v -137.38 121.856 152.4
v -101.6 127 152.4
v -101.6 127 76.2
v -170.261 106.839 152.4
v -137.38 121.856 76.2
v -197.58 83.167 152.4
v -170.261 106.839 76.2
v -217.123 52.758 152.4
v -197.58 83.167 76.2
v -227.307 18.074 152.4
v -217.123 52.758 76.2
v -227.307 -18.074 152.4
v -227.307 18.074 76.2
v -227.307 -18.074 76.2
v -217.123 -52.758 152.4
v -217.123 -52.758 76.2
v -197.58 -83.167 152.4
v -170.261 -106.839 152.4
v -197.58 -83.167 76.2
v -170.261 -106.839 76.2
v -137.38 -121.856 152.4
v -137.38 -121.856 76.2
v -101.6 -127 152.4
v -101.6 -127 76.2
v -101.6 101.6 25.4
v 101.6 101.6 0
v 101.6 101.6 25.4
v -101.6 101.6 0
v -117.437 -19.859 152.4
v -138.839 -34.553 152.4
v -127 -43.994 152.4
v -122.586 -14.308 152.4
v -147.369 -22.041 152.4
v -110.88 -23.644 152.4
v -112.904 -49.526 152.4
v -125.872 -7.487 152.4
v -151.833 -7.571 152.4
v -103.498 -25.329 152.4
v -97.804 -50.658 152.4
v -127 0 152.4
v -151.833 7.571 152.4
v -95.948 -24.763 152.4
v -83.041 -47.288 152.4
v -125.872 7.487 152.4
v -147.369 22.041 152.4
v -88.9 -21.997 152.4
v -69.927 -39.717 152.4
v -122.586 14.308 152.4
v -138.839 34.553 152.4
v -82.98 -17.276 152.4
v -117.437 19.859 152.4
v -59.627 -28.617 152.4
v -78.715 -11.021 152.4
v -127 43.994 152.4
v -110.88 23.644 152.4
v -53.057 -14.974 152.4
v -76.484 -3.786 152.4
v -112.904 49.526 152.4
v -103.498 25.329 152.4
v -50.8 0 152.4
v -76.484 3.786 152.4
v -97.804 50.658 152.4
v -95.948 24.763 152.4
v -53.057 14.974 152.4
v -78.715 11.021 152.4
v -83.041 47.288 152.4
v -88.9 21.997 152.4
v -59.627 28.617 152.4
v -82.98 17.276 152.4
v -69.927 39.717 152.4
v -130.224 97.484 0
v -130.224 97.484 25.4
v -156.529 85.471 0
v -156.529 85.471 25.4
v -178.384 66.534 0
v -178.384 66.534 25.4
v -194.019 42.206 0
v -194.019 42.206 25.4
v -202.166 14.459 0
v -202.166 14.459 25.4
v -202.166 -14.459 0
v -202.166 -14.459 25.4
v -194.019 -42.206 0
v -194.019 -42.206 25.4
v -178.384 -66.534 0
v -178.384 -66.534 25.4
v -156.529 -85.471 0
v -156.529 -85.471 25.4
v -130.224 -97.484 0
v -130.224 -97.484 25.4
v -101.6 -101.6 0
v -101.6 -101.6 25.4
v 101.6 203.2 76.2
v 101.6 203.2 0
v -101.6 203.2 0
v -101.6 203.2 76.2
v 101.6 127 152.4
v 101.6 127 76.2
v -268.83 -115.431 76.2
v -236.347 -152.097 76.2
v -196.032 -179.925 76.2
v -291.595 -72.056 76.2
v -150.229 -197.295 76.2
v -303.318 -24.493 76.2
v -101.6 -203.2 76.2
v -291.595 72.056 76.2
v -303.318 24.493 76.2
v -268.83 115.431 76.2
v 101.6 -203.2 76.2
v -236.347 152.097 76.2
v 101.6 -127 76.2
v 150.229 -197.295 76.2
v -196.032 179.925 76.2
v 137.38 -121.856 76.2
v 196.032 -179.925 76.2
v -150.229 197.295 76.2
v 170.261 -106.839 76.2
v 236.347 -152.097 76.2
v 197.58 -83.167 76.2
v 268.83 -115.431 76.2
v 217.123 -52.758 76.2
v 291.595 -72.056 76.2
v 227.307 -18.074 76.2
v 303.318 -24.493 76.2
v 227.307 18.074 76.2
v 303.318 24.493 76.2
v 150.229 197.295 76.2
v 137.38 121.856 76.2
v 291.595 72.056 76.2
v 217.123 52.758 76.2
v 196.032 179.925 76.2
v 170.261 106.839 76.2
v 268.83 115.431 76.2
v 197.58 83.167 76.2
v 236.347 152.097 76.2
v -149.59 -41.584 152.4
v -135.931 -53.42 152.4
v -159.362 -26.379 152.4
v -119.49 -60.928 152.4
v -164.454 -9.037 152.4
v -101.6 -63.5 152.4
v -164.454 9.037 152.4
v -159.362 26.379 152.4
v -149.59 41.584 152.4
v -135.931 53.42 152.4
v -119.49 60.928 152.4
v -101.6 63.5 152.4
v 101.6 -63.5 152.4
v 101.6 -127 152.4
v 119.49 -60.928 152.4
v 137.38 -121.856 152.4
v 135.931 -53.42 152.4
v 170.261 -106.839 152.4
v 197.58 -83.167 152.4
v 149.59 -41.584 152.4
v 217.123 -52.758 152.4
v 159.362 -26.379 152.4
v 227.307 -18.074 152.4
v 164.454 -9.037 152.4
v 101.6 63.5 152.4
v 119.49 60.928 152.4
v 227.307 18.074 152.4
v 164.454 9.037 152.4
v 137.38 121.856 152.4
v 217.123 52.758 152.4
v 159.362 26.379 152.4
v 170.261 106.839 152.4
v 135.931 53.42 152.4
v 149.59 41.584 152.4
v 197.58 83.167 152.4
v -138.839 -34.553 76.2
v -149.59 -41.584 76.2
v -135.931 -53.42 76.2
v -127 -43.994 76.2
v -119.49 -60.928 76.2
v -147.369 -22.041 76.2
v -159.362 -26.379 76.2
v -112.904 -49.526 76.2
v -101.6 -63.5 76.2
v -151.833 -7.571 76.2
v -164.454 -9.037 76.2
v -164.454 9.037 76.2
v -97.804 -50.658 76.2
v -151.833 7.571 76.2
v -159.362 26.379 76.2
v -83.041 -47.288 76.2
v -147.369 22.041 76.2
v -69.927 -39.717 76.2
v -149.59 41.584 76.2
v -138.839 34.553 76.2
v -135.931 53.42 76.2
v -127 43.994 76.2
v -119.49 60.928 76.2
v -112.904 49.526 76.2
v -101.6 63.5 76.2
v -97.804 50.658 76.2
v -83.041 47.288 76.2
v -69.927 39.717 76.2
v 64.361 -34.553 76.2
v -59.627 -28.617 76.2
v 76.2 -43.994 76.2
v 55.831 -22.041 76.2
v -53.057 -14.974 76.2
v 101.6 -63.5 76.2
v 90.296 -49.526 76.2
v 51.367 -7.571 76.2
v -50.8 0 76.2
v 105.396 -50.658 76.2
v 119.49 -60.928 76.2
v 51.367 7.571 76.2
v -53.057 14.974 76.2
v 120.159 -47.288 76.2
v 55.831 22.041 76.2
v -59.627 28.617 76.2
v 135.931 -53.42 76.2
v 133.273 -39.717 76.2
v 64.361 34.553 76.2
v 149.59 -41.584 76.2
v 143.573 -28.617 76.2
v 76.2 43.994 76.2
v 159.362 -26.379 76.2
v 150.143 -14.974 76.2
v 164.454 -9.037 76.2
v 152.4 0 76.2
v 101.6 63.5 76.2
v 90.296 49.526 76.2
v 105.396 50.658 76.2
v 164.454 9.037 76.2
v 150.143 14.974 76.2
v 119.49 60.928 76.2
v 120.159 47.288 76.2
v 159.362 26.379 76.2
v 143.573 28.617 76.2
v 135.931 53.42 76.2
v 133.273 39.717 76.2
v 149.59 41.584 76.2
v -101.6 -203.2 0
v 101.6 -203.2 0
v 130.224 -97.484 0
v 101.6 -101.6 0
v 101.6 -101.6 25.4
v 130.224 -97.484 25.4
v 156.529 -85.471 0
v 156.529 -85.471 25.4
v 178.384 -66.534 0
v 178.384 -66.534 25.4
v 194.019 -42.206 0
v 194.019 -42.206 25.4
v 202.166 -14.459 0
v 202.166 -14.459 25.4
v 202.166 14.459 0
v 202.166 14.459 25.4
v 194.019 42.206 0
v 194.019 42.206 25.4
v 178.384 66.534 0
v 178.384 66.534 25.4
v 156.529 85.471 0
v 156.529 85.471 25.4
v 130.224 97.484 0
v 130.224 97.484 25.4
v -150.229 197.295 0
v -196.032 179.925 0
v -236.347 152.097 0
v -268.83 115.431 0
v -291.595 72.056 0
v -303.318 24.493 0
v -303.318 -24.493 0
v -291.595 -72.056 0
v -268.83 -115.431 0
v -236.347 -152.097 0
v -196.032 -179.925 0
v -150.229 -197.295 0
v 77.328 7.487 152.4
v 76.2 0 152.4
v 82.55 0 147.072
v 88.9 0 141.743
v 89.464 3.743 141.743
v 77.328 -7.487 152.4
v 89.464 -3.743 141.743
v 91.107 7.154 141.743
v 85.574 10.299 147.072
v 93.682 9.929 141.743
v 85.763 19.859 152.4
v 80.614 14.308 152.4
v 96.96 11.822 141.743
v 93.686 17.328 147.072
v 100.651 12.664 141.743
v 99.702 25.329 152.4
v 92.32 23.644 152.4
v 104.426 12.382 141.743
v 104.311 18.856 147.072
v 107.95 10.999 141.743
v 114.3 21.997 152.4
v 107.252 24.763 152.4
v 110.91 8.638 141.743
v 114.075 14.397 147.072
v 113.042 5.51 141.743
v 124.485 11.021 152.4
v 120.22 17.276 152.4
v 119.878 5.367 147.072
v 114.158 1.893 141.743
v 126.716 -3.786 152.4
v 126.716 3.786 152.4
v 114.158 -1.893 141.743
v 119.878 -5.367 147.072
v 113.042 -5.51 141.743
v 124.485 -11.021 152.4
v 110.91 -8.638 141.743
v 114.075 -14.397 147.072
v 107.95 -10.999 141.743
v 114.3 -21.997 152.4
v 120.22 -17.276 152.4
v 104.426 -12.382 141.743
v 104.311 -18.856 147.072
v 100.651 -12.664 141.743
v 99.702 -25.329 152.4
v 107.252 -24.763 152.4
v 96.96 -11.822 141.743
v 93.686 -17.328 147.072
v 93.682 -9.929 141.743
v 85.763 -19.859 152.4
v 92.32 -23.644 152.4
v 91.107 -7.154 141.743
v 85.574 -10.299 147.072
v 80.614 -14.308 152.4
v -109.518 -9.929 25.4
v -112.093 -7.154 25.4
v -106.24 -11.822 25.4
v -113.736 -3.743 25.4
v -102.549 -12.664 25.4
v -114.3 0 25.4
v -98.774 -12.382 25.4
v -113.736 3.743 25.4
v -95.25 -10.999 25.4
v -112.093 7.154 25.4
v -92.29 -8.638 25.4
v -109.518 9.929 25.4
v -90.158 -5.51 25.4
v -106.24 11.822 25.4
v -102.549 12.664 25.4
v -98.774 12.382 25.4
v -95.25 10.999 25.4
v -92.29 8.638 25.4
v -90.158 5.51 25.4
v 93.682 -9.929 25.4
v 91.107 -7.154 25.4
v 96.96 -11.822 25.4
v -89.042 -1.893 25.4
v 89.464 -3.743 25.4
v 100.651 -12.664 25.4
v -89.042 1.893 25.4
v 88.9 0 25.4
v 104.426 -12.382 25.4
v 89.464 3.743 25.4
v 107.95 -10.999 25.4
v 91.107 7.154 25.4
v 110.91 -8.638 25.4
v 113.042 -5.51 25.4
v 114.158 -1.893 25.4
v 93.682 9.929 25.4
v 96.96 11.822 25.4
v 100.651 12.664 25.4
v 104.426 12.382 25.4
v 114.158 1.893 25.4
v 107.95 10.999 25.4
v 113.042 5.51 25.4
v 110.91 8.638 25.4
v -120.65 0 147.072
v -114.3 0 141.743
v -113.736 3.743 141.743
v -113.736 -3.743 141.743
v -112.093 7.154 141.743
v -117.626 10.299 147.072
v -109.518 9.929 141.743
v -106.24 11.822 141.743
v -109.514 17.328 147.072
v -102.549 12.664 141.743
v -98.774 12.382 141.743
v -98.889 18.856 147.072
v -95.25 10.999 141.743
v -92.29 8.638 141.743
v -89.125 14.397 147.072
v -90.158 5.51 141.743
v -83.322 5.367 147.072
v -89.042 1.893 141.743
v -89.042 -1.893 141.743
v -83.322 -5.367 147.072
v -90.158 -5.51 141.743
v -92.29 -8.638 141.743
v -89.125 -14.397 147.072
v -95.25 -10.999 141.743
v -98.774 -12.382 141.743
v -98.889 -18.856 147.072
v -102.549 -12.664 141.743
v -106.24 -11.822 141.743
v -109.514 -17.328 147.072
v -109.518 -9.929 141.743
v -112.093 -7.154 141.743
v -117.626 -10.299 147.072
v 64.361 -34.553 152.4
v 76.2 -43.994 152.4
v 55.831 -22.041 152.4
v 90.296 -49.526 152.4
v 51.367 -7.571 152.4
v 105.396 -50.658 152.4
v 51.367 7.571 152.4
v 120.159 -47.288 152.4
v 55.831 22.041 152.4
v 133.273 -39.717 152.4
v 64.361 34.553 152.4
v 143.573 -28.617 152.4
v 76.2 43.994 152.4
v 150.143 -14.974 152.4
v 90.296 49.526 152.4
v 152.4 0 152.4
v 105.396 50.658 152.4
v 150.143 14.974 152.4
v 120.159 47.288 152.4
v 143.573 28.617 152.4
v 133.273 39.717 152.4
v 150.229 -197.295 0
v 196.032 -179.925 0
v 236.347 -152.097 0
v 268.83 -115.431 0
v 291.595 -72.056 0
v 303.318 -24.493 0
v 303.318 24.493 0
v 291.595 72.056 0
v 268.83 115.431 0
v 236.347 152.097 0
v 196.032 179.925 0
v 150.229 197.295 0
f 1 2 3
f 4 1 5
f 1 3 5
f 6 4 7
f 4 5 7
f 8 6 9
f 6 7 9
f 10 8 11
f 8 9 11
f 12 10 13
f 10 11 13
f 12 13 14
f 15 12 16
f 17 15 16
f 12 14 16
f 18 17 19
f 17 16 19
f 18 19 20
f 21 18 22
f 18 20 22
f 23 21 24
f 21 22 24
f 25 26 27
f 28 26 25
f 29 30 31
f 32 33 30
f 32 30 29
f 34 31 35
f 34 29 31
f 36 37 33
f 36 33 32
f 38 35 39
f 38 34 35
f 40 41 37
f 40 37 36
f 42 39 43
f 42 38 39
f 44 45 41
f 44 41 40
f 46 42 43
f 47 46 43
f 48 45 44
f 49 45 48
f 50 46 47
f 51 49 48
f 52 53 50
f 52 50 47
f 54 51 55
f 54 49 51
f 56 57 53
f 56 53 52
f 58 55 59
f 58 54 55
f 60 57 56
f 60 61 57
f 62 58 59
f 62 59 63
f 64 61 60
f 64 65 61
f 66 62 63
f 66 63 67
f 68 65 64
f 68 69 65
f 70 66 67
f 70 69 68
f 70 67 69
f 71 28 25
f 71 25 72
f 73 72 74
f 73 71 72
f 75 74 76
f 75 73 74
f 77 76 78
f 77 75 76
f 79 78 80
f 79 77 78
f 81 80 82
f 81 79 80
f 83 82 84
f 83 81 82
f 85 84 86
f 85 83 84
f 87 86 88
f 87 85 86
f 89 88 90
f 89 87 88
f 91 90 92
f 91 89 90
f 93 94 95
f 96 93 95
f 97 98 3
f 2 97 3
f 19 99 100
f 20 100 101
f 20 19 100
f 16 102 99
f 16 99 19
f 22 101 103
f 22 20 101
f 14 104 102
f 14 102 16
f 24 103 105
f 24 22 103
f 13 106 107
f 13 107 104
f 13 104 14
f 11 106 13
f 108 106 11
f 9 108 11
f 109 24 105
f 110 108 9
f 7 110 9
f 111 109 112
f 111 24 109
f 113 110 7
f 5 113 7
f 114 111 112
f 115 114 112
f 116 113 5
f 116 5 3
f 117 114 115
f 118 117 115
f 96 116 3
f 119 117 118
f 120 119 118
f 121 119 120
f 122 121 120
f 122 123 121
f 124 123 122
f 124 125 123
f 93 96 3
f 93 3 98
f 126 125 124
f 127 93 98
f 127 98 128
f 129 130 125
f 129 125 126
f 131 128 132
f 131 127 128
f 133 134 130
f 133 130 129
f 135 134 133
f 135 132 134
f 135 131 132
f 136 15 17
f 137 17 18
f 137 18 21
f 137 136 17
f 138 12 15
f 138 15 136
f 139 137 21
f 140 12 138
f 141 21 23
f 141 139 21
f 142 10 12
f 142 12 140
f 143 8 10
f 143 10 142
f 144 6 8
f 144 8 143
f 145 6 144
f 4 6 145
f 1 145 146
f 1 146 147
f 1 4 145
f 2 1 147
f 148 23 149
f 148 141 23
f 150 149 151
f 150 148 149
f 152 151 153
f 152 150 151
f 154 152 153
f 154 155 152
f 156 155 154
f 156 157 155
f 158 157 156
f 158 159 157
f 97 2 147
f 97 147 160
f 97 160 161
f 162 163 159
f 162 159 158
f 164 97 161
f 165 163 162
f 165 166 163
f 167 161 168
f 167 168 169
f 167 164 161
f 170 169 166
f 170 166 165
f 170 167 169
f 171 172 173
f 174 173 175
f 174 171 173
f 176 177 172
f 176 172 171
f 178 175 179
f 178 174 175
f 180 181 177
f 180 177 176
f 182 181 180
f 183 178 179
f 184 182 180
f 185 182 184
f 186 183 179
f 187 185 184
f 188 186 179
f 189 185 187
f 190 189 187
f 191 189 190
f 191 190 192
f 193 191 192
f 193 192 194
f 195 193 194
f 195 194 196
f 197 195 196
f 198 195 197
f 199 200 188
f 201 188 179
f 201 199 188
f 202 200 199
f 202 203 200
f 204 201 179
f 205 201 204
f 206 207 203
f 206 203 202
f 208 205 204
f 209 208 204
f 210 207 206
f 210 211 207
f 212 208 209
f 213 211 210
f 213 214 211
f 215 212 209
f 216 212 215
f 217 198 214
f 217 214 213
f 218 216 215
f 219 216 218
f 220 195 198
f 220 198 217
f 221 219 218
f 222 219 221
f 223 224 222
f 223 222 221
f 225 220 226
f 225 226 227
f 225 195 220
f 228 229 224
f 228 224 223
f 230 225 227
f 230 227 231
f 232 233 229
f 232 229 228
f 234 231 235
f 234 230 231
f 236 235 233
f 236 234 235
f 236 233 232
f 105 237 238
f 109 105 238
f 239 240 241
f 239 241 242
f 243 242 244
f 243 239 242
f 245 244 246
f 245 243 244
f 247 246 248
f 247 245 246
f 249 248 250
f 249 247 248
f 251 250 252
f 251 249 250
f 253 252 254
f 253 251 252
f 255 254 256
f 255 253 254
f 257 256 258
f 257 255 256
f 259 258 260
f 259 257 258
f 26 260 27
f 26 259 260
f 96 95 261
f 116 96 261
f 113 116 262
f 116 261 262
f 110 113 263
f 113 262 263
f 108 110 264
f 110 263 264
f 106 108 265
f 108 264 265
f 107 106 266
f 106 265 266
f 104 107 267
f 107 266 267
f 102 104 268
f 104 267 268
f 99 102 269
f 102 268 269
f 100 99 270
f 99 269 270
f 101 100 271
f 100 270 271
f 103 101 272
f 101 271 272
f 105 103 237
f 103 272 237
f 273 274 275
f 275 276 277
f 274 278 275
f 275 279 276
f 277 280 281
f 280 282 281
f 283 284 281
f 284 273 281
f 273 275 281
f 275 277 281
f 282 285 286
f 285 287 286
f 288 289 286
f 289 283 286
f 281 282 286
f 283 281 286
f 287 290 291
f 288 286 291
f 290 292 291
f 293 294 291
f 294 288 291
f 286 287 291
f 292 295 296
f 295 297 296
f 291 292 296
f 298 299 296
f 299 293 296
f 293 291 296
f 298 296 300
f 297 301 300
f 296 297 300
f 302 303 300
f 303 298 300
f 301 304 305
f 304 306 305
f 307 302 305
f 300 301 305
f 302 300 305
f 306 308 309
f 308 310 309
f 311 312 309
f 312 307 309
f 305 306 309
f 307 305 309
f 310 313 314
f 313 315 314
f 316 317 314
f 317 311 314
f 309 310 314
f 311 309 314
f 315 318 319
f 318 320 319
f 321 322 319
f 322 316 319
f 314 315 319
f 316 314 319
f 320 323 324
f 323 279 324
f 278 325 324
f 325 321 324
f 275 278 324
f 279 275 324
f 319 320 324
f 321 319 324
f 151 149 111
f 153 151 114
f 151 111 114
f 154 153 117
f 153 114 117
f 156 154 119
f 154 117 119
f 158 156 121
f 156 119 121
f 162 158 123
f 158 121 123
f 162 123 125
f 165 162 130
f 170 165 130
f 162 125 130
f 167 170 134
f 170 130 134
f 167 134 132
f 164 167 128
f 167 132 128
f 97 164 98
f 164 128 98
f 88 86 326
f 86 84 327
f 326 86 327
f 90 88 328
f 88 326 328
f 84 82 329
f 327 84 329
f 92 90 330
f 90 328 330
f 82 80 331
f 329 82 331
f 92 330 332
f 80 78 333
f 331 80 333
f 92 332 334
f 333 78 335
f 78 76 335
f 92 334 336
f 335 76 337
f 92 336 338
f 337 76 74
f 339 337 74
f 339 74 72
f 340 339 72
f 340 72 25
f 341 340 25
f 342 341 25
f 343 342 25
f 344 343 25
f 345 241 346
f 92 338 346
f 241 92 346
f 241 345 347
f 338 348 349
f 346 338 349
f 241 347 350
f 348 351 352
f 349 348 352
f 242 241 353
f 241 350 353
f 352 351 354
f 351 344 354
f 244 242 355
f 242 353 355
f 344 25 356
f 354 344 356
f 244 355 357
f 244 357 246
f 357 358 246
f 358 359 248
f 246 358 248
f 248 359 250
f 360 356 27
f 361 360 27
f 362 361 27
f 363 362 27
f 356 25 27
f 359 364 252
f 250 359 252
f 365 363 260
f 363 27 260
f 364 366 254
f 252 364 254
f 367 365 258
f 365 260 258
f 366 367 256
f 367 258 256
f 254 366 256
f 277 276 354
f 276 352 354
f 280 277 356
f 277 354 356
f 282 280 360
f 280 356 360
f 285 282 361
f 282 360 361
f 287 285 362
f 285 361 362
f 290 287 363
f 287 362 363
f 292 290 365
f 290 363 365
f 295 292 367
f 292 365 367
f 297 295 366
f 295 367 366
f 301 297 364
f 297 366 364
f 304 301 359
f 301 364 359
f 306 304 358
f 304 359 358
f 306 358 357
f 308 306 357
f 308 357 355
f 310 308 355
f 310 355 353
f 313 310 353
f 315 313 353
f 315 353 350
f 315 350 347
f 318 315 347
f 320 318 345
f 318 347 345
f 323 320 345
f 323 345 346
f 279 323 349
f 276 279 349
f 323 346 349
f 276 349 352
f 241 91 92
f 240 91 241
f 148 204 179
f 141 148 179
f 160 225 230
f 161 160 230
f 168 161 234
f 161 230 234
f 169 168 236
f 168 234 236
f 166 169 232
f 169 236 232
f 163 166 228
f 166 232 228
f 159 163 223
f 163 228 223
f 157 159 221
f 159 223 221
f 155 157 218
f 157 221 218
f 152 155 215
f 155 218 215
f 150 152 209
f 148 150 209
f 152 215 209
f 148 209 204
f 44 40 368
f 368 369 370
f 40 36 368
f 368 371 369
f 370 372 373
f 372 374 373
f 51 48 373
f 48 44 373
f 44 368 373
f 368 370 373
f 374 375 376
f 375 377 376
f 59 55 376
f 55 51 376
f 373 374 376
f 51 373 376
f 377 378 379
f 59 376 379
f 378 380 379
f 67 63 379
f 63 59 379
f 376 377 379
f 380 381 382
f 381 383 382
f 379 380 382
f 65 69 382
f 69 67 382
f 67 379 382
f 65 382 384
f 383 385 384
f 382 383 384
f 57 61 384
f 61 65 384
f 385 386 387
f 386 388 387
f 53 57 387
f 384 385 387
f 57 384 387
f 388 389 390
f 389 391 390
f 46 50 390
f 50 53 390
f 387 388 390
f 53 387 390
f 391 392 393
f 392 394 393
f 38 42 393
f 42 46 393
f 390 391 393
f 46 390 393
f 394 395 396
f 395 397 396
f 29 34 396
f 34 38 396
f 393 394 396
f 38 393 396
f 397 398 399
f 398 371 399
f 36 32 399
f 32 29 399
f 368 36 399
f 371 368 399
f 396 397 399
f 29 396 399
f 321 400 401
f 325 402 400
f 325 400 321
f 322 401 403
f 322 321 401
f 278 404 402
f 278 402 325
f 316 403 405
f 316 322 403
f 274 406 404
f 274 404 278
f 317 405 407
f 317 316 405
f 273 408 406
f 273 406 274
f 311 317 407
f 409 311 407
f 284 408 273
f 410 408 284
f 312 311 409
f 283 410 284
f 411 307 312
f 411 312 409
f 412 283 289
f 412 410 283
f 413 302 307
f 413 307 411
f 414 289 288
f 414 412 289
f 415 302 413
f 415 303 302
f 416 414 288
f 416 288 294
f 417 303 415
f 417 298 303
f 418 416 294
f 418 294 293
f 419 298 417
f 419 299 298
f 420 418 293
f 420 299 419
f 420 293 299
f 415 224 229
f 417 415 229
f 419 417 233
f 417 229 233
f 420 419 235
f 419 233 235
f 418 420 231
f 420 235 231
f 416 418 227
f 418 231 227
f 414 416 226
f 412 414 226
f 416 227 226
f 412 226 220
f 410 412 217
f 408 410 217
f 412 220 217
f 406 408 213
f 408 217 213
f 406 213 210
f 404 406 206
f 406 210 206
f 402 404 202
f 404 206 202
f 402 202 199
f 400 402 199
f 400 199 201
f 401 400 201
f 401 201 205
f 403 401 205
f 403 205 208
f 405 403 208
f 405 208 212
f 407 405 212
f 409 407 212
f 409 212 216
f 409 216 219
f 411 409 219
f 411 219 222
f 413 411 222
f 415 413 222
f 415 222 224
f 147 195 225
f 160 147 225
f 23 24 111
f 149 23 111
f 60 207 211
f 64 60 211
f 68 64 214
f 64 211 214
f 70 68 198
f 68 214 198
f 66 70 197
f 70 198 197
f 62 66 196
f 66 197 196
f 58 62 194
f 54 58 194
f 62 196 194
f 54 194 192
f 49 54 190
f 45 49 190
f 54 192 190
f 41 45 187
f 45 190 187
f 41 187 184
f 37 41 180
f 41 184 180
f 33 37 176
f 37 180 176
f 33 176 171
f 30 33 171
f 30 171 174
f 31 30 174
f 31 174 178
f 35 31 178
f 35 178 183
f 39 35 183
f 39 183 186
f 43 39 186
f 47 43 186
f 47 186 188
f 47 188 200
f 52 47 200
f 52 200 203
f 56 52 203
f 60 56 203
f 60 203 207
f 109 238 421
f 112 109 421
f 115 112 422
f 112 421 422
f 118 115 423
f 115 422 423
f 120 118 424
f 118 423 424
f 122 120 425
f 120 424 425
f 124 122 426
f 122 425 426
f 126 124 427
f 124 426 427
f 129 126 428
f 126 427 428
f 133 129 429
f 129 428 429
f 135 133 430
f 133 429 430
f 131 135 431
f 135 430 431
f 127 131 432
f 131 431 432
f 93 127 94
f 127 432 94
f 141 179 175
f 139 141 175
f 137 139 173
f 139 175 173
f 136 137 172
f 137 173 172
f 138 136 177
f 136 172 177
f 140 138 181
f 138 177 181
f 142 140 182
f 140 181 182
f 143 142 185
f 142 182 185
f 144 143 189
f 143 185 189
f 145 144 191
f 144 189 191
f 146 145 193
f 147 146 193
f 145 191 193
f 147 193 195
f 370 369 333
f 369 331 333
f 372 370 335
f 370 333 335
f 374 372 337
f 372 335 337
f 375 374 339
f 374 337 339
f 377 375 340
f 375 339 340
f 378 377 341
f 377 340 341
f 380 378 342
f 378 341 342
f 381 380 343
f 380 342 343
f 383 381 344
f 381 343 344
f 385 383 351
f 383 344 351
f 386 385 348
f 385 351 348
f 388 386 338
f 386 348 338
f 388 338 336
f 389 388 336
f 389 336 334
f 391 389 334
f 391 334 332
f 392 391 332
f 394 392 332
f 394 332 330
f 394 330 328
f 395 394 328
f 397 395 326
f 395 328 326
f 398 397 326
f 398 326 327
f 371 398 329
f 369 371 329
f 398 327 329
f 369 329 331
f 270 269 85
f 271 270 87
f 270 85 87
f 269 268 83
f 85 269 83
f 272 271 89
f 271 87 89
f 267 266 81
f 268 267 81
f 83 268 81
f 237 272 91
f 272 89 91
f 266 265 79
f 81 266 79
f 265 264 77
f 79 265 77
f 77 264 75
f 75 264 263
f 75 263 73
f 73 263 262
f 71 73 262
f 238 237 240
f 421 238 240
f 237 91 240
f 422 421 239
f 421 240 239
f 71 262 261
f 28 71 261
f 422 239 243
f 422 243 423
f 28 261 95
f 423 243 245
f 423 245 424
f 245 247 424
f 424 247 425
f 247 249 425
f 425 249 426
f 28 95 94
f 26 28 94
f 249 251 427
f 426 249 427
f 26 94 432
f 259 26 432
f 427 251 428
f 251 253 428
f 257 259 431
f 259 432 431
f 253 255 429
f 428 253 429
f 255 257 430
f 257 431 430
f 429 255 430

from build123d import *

# Parameters (mm, degrees)
F0_R           = 50.8
F0_R_2         = 25.4
F1_DEPTH       = 76.2
F2_DEPTH       = 152.4
F4_DEPTH       = 25.4
F6_D           = 25.4
F6_CSINK_D     = 50.8
F6_CSINK_ANGLE = 100


# Not quite as in the source:
# - a feature names something its author has since deleted; it is built from what else it names


with BuildPart() as f1:
    # F0 (on Top) → F1 (new body)
    with BuildSketch(Plane.XY):
        with BuildLine():
            Line((101.6, 203.2), (-101.6, 203.2))
            ThreePointArc((-101.6, 203.2), (-304.8, 0), (-101.6, -203.2))
            Line((-101.6, -203.2), (101.6, -203.2))
            ThreePointArc((101.6, -203.2), (304.8, 0), (101.6, 203.2))
        make_face()
        with BuildLine():
            ThreePointArc((-101.6, -127), (-228.6, 0), (-101.6, 127))
            Line((-101.6, 127), (101.6, 127))
            ThreePointArc((101.6, 127), (228.6, 0), (101.6, -127))
            Line((101.6, -127), (-101.6, -127))
        make_face(mode=Mode.SUBTRACT)
        with BuildLine():
            Line((101.6, 127), (-101.6, 127))
            ThreePointArc((-101.6, 127), (-228.6, 0), (-101.6, -127))
            Line((-101.6, -127), (101.6, -127))
            ThreePointArc((101.6, -127), (228.6, 0), (101.6, 127))
        make_face()
        with BuildLine():
            ThreePointArc((101.6, 63.5), (165.1, 0), (101.6, -63.5))
            Line((101.6, -63.5), (-101.6, -63.5))
            ThreePointArc((-101.6, -63.5), (-165.1, 0), (-101.6, 63.5))
            Line((-101.6, 63.5), (101.6, 63.5))
        make_face(mode=Mode.SUBTRACT)
        with BuildLine():
            Line((-101.6, -63.5), (101.6, -63.5))
            ThreePointArc((101.6, -63.5), (165.1, 0), (101.6, 63.5))
            Line((101.6, 63.5), (-101.6, 63.5))
            ThreePointArc((-101.6, 63.5), (-165.1, 0), (-101.6, -63.5))
        make_face()
        with Locations((-101.6, 0)):
            Circle(F0_R, mode=Mode.SUBTRACT)
        with Locations((101.6, 0)):
            Circle(F0_R, mode=Mode.SUBTRACT)
        with Locations((-101.6, 0)):
            Circle(F0_R)
        with Locations((-101.6, 0)):
            Circle(F0_R_2, mode=Mode.SUBTRACT)
        with Locations((101.6, 0)):
            Circle(F0_R)
        with Locations((101.6, 0)):
            Circle(F0_R_2, mode=Mode.SUBTRACT)
        with Locations((-101.6, 0)):
            Circle(F0_R_2)
        with Locations((101.6, 0)):
            Circle(F0_R_2)
    extrude(amount=F1_DEPTH)

    # F0 (on Top) → F2 (join)
    with BuildSketch(Plane.XY):
        with BuildLine():
            Line((101.6, 127), (-101.6, 127))
            ThreePointArc((-101.6, 127), (-228.6, 0), (-101.6, -127))
            Line((-101.6, -127), (101.6, -127))
            ThreePointArc((101.6, -127), (228.6, 0), (101.6, 127))
        make_face()
        with BuildLine():
            ThreePointArc((101.6, 63.5), (165.1, 0), (101.6, -63.5))
            Line((101.6, -63.5), (-101.6, -63.5))
            ThreePointArc((-101.6, -63.5), (-165.1, 0), (-101.6, 63.5))
            Line((-101.6, 63.5), (101.6, 63.5))
        make_face(mode=Mode.SUBTRACT)
        with Locations((101.6, 0)):
            Circle(F0_R)
        with Locations((101.6, 0)):
            Circle(F0_R_2, mode=Mode.SUBTRACT)
        with Locations((-101.6, 0)):
            Circle(F0_R)
        with Locations((-101.6, 0)):
            Circle(F0_R_2, mode=Mode.SUBTRACT)
        with Locations((101.6, 0)):
            Circle(F0_R_2)
        with Locations((-101.6, 0)):
            Circle(F0_R_2)
    extrude(amount=F2_DEPTH)

    # F3 (on face) → F4 (cut)
    with BuildSketch(Plane.XY):
        with BuildLine():
            Line((101.6, 101.6), (-101.6, 101.6))
            ThreePointArc((-101.6, 101.6), (-203.2, 0), (-101.6, -101.6))
            Line((-101.6, -101.6), (101.6, -101.6))
            ThreePointArc((101.6, -101.6), (203.2, 0), (101.6, 101.6))
        make_face()
    extrude(amount=F4_DEPTH, mode=Mode.SUBTRACT)

    # F6 (through all)
    with Locations(Plane.XY.offset(152.4)):
        with Locations((-101.6, 0), (101.6, 0)):
            CounterSinkHole(F6_D / 2, F6_CSINK_D / 2, counter_sink_angle=F6_CSINK_ANGLE)


solid = f1.part
